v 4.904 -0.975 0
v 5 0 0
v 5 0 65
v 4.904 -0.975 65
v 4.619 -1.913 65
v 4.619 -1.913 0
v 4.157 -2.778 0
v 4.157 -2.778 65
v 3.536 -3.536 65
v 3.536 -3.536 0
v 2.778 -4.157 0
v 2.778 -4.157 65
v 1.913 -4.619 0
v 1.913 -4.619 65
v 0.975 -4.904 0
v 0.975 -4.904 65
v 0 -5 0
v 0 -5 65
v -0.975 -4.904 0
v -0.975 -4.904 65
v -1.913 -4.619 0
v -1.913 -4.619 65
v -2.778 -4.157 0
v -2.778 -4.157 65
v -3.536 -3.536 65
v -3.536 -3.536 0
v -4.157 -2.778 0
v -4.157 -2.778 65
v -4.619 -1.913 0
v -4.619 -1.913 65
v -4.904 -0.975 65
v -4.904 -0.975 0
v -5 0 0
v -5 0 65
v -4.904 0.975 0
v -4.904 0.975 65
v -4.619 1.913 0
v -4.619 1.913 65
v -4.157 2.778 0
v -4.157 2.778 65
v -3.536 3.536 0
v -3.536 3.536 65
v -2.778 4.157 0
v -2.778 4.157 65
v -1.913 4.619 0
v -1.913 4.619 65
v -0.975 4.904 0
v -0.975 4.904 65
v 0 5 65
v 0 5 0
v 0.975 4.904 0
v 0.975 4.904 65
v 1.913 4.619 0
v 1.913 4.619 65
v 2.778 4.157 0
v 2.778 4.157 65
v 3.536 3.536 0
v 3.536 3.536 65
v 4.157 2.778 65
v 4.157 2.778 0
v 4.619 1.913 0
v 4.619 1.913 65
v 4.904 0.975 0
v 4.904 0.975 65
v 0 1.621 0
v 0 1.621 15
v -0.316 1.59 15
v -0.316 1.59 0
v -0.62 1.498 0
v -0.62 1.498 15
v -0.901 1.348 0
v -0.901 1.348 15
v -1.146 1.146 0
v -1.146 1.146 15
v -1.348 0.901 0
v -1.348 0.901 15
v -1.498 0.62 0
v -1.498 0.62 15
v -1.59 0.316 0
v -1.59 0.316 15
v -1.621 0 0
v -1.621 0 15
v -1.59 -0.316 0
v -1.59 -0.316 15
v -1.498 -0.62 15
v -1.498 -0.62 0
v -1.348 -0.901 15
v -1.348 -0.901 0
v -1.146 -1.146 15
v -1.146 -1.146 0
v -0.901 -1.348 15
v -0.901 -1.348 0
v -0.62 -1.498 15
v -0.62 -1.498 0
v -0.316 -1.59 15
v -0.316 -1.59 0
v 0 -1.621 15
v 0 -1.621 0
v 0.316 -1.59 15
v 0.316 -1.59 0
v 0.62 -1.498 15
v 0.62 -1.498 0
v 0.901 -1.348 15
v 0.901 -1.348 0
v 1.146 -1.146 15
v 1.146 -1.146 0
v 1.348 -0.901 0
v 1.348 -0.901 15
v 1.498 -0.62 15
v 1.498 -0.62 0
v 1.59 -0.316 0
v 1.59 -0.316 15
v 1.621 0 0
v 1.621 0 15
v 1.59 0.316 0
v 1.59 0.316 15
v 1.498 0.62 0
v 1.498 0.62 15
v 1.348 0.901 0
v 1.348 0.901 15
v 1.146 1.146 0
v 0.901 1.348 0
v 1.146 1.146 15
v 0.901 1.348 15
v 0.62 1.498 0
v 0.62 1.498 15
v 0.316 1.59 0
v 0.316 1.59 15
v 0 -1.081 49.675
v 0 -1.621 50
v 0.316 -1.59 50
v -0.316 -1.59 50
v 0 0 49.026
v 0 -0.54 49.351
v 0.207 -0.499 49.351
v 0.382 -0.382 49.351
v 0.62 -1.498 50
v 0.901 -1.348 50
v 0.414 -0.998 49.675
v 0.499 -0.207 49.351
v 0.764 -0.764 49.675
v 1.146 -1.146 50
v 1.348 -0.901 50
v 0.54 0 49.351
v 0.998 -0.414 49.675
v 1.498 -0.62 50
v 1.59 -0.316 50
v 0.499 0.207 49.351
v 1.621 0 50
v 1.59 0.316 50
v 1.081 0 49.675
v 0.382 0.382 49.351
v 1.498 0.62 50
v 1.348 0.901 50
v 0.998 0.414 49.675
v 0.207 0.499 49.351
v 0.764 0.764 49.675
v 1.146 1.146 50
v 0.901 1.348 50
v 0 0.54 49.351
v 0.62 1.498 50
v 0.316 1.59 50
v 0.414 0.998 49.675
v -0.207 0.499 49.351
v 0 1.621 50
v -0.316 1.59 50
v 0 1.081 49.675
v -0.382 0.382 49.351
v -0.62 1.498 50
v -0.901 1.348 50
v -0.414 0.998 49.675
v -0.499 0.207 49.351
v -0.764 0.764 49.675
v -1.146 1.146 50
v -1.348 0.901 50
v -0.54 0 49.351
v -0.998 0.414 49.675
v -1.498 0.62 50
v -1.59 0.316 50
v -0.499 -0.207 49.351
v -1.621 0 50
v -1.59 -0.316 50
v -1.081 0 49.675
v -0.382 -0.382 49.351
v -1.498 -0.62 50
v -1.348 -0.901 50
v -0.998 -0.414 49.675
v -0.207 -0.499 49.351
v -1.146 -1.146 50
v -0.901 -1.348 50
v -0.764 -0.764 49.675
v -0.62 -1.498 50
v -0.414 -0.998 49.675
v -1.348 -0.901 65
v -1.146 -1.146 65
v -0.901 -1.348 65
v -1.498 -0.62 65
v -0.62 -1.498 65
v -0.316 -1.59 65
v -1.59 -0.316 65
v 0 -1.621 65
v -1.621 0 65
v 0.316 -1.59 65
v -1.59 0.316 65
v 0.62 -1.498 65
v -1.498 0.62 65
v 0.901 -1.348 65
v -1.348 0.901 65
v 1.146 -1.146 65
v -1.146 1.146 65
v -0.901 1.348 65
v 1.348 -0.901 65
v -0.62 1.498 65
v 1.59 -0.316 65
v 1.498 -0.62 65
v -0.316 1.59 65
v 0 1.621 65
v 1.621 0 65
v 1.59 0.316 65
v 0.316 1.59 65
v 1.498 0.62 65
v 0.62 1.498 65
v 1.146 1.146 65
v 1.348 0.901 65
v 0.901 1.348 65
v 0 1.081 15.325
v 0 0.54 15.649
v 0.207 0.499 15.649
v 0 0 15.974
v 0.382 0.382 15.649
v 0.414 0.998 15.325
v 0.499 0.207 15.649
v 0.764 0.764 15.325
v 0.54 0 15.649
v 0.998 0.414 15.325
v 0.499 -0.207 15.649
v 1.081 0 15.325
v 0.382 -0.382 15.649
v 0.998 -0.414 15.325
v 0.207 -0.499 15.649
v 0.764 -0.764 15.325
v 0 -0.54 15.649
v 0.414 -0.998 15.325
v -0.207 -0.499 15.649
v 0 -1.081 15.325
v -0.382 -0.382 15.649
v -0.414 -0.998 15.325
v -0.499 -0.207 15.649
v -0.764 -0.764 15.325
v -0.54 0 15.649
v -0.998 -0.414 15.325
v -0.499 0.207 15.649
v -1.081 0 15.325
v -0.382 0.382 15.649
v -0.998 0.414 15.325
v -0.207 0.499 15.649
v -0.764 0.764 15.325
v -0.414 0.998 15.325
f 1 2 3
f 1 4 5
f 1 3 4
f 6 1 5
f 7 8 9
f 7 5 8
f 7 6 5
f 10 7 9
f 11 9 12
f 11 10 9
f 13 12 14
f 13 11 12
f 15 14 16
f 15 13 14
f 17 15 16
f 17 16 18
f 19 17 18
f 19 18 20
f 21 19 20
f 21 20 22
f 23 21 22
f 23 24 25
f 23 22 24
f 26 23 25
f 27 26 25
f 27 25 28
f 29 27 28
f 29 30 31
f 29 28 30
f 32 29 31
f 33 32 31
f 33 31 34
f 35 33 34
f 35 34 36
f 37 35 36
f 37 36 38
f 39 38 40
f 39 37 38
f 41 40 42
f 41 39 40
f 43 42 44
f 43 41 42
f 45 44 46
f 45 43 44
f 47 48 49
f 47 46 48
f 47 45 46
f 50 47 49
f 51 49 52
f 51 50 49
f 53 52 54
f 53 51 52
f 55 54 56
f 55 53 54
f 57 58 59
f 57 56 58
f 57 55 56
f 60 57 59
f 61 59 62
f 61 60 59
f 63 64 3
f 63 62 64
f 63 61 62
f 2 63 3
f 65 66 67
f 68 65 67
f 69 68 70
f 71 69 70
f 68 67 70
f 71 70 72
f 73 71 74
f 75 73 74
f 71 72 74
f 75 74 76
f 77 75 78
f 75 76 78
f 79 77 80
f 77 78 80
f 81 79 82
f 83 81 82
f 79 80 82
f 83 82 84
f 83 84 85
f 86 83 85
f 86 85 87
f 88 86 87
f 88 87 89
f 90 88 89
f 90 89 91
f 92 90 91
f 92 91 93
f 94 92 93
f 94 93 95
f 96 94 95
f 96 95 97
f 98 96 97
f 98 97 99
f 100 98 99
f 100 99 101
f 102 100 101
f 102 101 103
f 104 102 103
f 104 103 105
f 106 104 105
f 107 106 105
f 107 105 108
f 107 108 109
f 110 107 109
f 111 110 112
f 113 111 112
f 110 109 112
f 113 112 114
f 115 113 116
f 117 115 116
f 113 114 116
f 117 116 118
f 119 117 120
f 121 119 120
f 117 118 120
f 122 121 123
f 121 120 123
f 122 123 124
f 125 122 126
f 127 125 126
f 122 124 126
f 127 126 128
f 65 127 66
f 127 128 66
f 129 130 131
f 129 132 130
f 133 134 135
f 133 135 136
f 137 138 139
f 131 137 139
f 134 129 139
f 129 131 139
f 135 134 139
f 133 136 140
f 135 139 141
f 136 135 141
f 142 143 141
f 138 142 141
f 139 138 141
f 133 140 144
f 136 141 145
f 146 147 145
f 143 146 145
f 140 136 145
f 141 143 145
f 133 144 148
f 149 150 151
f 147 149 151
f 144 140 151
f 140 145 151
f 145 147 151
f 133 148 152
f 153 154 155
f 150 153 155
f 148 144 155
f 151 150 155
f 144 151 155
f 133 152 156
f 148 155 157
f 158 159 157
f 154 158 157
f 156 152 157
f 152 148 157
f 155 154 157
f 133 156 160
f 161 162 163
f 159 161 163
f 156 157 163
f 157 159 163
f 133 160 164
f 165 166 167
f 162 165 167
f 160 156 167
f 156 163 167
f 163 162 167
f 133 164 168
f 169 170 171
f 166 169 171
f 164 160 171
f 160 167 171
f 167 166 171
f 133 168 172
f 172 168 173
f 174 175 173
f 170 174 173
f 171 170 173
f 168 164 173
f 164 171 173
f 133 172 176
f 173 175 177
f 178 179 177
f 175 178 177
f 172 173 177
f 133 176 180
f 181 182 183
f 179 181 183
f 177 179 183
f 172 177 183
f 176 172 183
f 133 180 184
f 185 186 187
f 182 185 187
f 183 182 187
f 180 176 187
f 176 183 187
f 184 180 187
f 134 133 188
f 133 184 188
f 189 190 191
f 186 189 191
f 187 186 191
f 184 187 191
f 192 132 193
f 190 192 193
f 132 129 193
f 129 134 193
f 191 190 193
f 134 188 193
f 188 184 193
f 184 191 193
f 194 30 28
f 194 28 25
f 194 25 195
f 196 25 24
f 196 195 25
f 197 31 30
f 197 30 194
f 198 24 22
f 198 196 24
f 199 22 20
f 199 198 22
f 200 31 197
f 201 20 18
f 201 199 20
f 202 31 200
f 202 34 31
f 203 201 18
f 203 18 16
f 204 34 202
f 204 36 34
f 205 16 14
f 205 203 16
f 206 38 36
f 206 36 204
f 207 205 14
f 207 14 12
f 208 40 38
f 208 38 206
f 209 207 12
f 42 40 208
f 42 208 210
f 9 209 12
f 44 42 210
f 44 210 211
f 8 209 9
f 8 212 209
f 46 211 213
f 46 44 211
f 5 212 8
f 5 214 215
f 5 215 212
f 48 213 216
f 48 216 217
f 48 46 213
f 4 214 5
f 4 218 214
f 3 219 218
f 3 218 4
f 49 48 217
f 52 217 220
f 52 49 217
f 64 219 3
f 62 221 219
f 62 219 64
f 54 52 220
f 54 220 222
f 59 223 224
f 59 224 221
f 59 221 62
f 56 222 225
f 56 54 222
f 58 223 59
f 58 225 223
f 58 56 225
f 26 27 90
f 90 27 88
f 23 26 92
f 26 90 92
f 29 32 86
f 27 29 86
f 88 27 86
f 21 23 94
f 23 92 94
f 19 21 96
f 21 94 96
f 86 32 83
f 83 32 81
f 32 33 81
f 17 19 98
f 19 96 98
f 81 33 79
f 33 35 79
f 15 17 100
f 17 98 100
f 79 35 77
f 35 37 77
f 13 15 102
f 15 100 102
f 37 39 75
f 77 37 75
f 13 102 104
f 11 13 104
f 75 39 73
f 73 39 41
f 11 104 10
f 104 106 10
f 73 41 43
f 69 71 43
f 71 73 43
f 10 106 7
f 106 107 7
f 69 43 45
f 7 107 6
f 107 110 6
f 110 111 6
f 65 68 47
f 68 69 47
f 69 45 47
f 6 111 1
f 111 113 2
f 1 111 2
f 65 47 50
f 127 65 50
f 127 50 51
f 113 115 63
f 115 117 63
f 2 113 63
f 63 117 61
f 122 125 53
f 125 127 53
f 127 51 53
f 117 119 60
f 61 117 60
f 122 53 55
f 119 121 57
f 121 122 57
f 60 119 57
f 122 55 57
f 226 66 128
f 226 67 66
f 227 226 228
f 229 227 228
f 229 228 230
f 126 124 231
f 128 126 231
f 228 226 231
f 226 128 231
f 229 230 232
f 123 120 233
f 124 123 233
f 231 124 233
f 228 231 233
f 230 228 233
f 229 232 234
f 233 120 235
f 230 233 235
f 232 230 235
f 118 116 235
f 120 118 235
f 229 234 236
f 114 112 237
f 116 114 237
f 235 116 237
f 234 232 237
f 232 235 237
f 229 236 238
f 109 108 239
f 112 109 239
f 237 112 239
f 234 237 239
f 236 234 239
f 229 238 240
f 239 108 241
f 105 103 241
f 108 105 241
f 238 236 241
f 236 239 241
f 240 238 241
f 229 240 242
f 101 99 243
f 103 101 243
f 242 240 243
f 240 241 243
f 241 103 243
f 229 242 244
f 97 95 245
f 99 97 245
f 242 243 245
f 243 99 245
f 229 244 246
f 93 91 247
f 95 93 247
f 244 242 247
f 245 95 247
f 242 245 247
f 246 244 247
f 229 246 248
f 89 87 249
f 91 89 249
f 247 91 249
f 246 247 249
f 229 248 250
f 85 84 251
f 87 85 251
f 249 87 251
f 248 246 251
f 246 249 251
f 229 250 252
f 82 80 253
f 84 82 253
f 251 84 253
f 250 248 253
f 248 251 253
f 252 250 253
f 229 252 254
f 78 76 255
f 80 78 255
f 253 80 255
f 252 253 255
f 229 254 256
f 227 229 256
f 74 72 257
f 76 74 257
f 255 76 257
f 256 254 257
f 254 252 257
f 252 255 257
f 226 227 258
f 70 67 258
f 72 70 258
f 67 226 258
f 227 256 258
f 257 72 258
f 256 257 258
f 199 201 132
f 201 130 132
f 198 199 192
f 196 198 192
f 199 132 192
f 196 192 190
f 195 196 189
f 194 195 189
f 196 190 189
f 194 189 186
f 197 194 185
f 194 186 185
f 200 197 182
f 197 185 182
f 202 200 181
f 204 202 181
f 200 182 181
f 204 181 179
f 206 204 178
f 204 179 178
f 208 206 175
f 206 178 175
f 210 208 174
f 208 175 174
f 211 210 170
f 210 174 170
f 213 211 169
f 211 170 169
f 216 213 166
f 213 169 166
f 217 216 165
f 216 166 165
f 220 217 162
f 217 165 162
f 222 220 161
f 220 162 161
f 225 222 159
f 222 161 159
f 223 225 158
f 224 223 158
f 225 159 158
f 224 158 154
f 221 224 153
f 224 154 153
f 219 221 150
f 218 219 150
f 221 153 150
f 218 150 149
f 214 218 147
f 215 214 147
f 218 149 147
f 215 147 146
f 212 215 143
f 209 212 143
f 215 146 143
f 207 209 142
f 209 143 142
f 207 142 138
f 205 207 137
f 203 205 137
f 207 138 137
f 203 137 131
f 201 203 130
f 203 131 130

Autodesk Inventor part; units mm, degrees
ref_plane "YZ Plane" through (0, 0, 0) normal (1, 0, 0) x (0, 1, 0)
ref_plane "XZ Plane" through (0, 0, 0) normal (0, 1, 0) x (-1, 0, 0)
ref_plane "XY Plane" through (0, 0, 0) normal (0, 0, 1) x (1, 0, 0)
sketch "スケッチ1" plane through (0, 0, 0) normal (0, 0, 1) x (1, 0, 0)
  circle A0 centre (0, 0) radius 5
  dimension "d0" = 10
extrude "押し出し1" add sketch "スケッチ1" along normal blind 65
sketch "スケッチ2" plane through (0, 0, 65) normal (0, 0, 1) x (1, 0, 0)
  point P0 (0, 0)
  point P1 (0, 0)
hole "穴1" at (0, 0, 65) direction (0, 0, -1) diameter 3.242 depth 15 tip angle 118 thread size "M4x0.7" class "6H" standard "ANSI Metric M Profile"
sketch "スケッチ3" plane through (0, 0, 0) normal (0, 0, -1) x (-1, 0, 0)
  circle A0 centre (0, 0) radius 1.621 projected
hole "穴2" at (0, 0, 0) direction (0, 0, 1) diameter 3.242 depth 15 tip angle 118 thread size "M4x0.7" class "6H" standard "ANSI Metric M Profile"
properties part number "link1part3" material "アルミニウム 6061"
